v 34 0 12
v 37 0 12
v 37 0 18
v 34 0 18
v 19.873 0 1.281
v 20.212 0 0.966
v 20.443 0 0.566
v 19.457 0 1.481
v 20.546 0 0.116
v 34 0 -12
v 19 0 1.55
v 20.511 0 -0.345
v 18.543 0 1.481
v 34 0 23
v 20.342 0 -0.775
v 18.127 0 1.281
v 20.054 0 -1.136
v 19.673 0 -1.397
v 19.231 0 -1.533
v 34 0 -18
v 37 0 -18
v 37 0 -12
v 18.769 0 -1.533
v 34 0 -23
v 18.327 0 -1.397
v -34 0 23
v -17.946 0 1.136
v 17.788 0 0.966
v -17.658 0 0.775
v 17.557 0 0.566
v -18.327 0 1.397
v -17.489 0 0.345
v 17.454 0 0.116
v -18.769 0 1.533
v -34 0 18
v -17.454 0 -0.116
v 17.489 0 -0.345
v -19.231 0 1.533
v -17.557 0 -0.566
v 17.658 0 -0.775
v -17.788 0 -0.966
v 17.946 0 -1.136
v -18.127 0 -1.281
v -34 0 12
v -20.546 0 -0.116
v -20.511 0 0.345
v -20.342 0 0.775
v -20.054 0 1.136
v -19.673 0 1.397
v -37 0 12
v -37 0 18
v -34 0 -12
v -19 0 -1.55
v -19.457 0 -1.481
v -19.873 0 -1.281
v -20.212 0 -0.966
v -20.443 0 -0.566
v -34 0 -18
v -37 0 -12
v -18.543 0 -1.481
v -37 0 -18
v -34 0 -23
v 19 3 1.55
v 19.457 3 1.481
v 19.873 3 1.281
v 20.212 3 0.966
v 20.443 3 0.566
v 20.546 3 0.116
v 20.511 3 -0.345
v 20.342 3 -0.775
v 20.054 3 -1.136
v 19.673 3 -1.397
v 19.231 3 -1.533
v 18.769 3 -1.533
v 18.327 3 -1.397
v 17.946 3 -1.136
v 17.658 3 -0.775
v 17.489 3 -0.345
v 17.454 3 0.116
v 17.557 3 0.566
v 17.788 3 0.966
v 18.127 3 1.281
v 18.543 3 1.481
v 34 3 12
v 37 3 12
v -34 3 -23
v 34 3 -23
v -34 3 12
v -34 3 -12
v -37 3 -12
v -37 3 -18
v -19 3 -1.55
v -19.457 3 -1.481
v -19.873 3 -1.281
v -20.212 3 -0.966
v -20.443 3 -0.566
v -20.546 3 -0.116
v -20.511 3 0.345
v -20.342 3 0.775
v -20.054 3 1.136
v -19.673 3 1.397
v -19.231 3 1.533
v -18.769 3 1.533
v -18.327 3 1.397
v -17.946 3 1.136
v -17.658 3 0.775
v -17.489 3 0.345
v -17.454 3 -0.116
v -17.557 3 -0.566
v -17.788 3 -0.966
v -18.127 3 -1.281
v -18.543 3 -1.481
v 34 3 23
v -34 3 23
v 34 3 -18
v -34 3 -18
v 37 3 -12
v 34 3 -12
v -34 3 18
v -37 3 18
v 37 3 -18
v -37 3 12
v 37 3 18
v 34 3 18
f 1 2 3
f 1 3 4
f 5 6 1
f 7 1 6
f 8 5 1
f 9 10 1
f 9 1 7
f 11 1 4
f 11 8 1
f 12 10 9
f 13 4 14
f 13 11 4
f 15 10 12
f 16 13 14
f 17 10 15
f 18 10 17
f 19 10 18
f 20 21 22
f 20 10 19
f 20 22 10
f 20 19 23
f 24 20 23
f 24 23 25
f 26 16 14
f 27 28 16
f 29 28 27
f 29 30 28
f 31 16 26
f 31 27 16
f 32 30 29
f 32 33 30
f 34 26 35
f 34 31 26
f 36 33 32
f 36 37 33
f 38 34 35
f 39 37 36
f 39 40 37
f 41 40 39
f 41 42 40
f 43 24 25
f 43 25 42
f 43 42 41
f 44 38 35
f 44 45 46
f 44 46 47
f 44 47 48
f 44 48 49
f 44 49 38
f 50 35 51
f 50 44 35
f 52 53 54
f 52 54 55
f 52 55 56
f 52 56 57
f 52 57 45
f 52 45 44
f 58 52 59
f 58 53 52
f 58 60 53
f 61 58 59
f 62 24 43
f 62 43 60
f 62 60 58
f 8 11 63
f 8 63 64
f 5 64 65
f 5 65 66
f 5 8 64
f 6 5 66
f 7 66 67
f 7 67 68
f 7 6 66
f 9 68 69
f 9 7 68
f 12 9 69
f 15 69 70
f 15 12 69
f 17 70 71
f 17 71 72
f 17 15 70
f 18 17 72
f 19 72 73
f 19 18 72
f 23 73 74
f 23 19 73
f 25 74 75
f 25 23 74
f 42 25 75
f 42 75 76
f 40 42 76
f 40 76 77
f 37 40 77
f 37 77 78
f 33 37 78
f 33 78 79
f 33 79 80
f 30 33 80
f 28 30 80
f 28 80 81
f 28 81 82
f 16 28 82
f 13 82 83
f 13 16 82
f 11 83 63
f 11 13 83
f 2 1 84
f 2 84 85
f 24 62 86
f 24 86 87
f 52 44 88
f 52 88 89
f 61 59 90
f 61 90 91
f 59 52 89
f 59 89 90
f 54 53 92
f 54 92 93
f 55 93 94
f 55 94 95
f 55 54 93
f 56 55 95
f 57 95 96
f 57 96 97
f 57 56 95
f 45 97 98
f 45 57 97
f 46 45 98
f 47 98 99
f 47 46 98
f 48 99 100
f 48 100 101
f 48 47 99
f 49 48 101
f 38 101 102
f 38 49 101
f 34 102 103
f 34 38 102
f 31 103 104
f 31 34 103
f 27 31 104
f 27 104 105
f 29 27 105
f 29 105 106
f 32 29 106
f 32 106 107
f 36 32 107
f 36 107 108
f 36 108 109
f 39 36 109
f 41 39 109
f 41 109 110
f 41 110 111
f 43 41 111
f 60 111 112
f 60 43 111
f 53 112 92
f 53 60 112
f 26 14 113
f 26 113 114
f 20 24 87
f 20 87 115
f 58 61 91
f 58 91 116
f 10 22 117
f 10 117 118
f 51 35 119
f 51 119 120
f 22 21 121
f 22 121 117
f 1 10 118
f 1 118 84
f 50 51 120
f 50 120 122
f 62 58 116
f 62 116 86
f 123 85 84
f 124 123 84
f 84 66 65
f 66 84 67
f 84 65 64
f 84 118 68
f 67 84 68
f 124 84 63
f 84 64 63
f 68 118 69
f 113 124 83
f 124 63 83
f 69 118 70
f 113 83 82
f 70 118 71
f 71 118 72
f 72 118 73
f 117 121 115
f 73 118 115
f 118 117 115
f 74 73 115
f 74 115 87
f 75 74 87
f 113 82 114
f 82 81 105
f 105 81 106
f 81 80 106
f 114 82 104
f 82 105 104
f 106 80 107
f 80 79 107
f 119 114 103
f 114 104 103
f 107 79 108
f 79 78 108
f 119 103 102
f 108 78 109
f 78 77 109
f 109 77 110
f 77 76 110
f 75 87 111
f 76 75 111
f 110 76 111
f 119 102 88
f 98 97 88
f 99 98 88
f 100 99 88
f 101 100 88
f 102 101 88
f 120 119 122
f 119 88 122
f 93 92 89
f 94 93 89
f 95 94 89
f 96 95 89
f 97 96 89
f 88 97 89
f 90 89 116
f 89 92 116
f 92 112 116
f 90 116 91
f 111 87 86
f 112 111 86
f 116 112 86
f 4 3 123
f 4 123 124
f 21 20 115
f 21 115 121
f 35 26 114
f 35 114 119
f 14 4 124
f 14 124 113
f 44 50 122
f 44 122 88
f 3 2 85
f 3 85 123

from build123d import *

# Parameters (mm, degrees)
SKETCH1_R           = 1.55
BOSS_EXTRUDE1_DEPTH = 3


with BuildPart() as part:
    # Sketch1 → Boss-Extrude1 (new body)
    with BuildSketch(Plane(origin=(0, 0, 0), x_dir=(1, 0, 0), z_dir=(0, 1, 0))):
        Polygon((-34, 23), (34, 23), (34, 18), (37, 18), (37, 12), (34, 12), (34, -12), (37, -12), (37, -18), (34, -18), (34, -23), (-34, -23), (-34, -18), (-37, -18), (-37, -12), (-34, -12), (-34, 12), (-37, 12), (-37, 18), (-34, 18), align=None)
        with Locations(Location((19, 0, 0), (0, 0, 270))):
            Circle(SKETCH1_R, mode=Mode.SUBTRACT)
        with Locations(Location((-19, 0, 0), (0, 0, 90))):
            Circle(SKETCH1_R, mode=Mode.SUBTRACT)
    extrude(amount=BOSS_EXTRUDE1_DEPTH)


solid = part.part
